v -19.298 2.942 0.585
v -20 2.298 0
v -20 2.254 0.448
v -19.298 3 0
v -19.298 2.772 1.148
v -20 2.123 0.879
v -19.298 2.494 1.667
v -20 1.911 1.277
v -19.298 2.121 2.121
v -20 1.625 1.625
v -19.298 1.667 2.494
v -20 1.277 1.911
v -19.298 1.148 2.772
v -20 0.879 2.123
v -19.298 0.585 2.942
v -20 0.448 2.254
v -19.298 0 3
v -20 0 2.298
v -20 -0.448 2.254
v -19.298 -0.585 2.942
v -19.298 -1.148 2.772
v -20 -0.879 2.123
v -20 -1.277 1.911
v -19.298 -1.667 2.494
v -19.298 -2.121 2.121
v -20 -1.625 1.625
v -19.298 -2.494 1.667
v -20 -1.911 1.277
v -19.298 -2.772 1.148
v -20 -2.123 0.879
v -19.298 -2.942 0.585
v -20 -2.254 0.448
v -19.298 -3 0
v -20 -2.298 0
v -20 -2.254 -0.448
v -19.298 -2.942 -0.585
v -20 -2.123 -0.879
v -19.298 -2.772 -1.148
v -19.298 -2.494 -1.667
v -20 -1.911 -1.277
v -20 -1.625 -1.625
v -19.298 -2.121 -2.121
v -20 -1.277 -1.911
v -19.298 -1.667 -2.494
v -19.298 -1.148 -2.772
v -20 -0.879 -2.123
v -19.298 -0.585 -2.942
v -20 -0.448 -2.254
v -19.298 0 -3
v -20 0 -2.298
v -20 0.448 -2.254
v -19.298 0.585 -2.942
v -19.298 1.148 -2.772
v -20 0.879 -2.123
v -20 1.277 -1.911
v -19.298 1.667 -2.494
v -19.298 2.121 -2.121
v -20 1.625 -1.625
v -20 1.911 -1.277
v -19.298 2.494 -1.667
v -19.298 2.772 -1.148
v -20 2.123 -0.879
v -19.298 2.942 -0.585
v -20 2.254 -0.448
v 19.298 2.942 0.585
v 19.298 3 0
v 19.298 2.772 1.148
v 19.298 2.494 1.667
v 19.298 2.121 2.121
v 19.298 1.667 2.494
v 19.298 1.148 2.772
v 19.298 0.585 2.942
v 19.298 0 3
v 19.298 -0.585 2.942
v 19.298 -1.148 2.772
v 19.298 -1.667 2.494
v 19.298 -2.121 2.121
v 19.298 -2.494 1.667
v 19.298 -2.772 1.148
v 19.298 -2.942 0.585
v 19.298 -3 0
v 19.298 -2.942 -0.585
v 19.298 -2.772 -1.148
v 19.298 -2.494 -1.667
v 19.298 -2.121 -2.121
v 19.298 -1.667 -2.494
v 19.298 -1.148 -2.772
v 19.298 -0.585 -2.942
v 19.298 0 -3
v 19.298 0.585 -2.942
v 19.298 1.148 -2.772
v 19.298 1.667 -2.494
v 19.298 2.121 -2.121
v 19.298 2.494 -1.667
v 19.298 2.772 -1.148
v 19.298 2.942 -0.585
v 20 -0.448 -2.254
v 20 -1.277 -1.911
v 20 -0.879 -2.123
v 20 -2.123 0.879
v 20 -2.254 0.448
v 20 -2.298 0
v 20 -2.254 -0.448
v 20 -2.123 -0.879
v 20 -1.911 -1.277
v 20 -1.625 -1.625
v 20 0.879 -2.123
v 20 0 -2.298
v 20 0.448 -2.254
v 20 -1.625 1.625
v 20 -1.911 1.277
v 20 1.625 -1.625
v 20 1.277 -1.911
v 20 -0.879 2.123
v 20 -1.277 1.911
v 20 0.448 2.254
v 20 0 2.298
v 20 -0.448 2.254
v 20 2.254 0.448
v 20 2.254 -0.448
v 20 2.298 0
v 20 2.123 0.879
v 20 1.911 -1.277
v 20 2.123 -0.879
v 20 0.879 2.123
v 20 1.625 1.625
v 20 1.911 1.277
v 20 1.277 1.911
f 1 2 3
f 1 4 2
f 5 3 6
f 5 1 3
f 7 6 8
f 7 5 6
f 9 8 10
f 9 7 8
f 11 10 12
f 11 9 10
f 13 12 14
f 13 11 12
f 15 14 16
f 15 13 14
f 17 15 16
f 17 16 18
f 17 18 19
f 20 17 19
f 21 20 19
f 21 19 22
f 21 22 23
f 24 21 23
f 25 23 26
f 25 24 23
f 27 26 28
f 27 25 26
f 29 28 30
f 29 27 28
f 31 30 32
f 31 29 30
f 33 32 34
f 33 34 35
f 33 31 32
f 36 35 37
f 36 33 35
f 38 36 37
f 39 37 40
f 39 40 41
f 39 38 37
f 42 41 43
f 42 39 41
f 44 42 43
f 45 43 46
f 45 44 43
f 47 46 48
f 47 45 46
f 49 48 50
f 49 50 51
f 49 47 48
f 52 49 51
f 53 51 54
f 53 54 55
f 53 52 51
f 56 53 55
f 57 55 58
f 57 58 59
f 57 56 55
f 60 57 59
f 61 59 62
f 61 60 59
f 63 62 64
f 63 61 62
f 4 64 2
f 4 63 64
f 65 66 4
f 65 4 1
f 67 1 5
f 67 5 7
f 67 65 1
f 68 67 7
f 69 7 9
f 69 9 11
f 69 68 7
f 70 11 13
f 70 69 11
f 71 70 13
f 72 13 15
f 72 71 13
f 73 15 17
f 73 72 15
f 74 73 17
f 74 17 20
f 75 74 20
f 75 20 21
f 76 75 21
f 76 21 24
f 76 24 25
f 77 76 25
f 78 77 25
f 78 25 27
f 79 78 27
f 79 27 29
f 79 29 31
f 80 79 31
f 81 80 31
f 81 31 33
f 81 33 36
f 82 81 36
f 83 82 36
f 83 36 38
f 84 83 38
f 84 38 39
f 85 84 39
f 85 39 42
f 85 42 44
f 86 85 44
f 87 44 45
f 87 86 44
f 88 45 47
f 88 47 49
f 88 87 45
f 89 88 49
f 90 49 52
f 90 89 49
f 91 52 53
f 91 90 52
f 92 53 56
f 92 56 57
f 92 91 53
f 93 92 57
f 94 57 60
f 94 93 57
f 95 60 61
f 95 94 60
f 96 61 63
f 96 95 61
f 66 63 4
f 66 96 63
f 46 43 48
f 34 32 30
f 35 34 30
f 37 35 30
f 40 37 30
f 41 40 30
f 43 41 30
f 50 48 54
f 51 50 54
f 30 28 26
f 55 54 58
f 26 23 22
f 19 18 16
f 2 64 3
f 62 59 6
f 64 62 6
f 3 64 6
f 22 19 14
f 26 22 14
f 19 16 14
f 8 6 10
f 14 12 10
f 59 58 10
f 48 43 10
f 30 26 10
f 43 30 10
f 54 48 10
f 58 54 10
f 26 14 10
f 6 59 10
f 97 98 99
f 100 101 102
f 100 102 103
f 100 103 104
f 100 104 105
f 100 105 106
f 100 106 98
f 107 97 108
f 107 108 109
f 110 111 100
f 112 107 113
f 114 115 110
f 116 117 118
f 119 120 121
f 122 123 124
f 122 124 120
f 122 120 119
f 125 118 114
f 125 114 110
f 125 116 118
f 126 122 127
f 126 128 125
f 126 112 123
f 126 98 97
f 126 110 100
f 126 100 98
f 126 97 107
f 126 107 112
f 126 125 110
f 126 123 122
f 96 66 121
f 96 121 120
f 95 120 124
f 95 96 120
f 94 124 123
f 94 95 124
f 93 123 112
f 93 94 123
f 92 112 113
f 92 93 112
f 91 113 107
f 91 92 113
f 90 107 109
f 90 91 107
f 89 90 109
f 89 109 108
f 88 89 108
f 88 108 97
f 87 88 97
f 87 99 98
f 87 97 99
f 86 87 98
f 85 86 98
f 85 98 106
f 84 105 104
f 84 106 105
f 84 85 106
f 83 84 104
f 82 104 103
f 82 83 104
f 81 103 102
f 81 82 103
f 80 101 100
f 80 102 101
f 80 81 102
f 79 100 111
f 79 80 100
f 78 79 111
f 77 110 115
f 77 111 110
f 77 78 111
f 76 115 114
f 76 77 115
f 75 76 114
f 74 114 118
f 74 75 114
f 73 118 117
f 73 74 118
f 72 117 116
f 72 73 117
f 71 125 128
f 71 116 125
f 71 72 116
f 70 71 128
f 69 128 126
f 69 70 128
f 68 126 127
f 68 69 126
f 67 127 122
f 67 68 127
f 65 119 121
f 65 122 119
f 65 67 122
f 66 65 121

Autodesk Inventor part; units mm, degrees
ref_plane "YZ Plane" through (0, 0, 0) normal (1, 0, 0) x (0, 1, 0)
ref_plane "XZ Plane" through (0, 0, 0) normal (0, 1, 0) x (-1, 0, 0)
sketch "Schizzo1" plane through (0, 0, 0) normal (0, 0, 1) x (1, 0, 0)
  line L0 (20, 3) -> (20, 0)
  line L1 (-20, 0) -> (20, 0)
  line L2 (-28, 0) -> (28, 0) projected
  line L3 (0, 3.6) -> (0, -0.6) projected
  line L4 (-20, 3) -> (-20, 0)
  line L5 (0, 3) -> (0, 0) construction
  line L6 (-28, 0) -> (28, 0) projected
  line L7 (-20, 3) -> (20, 3)
  dimension "d13" = 6
  dimension "d87" = 40
  dimension "d88" = 20
revolve "Corpo" add sketch "Schizzo1" angle 360 about axis through (-20, 0, 0) along (1, 0, 0)
thread "Filettatura1" size "M6x1" class "6g" standard "ISO Metric profile" length 40
chamfer "Smusso1" distance 0.702 angle 45 1 edges at (20, -3, 0) measured on face at (6.6667, 2.9612, -0.4812)
chamfer "Smusso2" distance 0.702 angle 45 1 edges at (-20, -3, 0) measured on face at (6.1987, 2.9903, -0.2414)
ref_plane "Work Plane1" through (2.75, 0, 0) normal (0, -1, 0) x (1, 0, 0)
equation "\"d13\" = NND"
equation "\"d87\" = NLG"
equation "\"d88\" = 0.5 * NLG"
equation "\"d1\" = GEL"
equation "\"d9\" = -0.5 * SPD + 0.5 * NND"
equation "\"d10\" = -0.5 * SPD + 0.5 * NND"
equation "\"d11\" = -0.5 * SPD + 0.5 * NND"
equation "\"d12\" = -0.5 * SPD + 0.5 * NND"
equation "\"NLG\" = 40"
equation "\"GEL\" = NLG"
equation "\"GAL\" = 0.61345 * PTC"
equation "\"SPD\" = 4.596"
equation "\"d0\" = NND"
equation "\"GUL\" = 0.61345 * PTC"
equation "\"NND\" = 6"
equation "\"GUL1\" = GUL"
equation "\"GAL1\" = GAL"
equation "\"d80\" = -GUL - GEL"
equation "\"d86\" = -GEL + GUL1"
equation "\"PTC\" = 1"
equation "\"THREADDIA\" = 6"
equation "\"TOA\" = 30deg"
equation "\"GD1\" = THREADDIA - 1.2269 * PTC"
properties part number "DIN 976-1 - M6 x 40 - B" material "Acciaio, Dolce"
